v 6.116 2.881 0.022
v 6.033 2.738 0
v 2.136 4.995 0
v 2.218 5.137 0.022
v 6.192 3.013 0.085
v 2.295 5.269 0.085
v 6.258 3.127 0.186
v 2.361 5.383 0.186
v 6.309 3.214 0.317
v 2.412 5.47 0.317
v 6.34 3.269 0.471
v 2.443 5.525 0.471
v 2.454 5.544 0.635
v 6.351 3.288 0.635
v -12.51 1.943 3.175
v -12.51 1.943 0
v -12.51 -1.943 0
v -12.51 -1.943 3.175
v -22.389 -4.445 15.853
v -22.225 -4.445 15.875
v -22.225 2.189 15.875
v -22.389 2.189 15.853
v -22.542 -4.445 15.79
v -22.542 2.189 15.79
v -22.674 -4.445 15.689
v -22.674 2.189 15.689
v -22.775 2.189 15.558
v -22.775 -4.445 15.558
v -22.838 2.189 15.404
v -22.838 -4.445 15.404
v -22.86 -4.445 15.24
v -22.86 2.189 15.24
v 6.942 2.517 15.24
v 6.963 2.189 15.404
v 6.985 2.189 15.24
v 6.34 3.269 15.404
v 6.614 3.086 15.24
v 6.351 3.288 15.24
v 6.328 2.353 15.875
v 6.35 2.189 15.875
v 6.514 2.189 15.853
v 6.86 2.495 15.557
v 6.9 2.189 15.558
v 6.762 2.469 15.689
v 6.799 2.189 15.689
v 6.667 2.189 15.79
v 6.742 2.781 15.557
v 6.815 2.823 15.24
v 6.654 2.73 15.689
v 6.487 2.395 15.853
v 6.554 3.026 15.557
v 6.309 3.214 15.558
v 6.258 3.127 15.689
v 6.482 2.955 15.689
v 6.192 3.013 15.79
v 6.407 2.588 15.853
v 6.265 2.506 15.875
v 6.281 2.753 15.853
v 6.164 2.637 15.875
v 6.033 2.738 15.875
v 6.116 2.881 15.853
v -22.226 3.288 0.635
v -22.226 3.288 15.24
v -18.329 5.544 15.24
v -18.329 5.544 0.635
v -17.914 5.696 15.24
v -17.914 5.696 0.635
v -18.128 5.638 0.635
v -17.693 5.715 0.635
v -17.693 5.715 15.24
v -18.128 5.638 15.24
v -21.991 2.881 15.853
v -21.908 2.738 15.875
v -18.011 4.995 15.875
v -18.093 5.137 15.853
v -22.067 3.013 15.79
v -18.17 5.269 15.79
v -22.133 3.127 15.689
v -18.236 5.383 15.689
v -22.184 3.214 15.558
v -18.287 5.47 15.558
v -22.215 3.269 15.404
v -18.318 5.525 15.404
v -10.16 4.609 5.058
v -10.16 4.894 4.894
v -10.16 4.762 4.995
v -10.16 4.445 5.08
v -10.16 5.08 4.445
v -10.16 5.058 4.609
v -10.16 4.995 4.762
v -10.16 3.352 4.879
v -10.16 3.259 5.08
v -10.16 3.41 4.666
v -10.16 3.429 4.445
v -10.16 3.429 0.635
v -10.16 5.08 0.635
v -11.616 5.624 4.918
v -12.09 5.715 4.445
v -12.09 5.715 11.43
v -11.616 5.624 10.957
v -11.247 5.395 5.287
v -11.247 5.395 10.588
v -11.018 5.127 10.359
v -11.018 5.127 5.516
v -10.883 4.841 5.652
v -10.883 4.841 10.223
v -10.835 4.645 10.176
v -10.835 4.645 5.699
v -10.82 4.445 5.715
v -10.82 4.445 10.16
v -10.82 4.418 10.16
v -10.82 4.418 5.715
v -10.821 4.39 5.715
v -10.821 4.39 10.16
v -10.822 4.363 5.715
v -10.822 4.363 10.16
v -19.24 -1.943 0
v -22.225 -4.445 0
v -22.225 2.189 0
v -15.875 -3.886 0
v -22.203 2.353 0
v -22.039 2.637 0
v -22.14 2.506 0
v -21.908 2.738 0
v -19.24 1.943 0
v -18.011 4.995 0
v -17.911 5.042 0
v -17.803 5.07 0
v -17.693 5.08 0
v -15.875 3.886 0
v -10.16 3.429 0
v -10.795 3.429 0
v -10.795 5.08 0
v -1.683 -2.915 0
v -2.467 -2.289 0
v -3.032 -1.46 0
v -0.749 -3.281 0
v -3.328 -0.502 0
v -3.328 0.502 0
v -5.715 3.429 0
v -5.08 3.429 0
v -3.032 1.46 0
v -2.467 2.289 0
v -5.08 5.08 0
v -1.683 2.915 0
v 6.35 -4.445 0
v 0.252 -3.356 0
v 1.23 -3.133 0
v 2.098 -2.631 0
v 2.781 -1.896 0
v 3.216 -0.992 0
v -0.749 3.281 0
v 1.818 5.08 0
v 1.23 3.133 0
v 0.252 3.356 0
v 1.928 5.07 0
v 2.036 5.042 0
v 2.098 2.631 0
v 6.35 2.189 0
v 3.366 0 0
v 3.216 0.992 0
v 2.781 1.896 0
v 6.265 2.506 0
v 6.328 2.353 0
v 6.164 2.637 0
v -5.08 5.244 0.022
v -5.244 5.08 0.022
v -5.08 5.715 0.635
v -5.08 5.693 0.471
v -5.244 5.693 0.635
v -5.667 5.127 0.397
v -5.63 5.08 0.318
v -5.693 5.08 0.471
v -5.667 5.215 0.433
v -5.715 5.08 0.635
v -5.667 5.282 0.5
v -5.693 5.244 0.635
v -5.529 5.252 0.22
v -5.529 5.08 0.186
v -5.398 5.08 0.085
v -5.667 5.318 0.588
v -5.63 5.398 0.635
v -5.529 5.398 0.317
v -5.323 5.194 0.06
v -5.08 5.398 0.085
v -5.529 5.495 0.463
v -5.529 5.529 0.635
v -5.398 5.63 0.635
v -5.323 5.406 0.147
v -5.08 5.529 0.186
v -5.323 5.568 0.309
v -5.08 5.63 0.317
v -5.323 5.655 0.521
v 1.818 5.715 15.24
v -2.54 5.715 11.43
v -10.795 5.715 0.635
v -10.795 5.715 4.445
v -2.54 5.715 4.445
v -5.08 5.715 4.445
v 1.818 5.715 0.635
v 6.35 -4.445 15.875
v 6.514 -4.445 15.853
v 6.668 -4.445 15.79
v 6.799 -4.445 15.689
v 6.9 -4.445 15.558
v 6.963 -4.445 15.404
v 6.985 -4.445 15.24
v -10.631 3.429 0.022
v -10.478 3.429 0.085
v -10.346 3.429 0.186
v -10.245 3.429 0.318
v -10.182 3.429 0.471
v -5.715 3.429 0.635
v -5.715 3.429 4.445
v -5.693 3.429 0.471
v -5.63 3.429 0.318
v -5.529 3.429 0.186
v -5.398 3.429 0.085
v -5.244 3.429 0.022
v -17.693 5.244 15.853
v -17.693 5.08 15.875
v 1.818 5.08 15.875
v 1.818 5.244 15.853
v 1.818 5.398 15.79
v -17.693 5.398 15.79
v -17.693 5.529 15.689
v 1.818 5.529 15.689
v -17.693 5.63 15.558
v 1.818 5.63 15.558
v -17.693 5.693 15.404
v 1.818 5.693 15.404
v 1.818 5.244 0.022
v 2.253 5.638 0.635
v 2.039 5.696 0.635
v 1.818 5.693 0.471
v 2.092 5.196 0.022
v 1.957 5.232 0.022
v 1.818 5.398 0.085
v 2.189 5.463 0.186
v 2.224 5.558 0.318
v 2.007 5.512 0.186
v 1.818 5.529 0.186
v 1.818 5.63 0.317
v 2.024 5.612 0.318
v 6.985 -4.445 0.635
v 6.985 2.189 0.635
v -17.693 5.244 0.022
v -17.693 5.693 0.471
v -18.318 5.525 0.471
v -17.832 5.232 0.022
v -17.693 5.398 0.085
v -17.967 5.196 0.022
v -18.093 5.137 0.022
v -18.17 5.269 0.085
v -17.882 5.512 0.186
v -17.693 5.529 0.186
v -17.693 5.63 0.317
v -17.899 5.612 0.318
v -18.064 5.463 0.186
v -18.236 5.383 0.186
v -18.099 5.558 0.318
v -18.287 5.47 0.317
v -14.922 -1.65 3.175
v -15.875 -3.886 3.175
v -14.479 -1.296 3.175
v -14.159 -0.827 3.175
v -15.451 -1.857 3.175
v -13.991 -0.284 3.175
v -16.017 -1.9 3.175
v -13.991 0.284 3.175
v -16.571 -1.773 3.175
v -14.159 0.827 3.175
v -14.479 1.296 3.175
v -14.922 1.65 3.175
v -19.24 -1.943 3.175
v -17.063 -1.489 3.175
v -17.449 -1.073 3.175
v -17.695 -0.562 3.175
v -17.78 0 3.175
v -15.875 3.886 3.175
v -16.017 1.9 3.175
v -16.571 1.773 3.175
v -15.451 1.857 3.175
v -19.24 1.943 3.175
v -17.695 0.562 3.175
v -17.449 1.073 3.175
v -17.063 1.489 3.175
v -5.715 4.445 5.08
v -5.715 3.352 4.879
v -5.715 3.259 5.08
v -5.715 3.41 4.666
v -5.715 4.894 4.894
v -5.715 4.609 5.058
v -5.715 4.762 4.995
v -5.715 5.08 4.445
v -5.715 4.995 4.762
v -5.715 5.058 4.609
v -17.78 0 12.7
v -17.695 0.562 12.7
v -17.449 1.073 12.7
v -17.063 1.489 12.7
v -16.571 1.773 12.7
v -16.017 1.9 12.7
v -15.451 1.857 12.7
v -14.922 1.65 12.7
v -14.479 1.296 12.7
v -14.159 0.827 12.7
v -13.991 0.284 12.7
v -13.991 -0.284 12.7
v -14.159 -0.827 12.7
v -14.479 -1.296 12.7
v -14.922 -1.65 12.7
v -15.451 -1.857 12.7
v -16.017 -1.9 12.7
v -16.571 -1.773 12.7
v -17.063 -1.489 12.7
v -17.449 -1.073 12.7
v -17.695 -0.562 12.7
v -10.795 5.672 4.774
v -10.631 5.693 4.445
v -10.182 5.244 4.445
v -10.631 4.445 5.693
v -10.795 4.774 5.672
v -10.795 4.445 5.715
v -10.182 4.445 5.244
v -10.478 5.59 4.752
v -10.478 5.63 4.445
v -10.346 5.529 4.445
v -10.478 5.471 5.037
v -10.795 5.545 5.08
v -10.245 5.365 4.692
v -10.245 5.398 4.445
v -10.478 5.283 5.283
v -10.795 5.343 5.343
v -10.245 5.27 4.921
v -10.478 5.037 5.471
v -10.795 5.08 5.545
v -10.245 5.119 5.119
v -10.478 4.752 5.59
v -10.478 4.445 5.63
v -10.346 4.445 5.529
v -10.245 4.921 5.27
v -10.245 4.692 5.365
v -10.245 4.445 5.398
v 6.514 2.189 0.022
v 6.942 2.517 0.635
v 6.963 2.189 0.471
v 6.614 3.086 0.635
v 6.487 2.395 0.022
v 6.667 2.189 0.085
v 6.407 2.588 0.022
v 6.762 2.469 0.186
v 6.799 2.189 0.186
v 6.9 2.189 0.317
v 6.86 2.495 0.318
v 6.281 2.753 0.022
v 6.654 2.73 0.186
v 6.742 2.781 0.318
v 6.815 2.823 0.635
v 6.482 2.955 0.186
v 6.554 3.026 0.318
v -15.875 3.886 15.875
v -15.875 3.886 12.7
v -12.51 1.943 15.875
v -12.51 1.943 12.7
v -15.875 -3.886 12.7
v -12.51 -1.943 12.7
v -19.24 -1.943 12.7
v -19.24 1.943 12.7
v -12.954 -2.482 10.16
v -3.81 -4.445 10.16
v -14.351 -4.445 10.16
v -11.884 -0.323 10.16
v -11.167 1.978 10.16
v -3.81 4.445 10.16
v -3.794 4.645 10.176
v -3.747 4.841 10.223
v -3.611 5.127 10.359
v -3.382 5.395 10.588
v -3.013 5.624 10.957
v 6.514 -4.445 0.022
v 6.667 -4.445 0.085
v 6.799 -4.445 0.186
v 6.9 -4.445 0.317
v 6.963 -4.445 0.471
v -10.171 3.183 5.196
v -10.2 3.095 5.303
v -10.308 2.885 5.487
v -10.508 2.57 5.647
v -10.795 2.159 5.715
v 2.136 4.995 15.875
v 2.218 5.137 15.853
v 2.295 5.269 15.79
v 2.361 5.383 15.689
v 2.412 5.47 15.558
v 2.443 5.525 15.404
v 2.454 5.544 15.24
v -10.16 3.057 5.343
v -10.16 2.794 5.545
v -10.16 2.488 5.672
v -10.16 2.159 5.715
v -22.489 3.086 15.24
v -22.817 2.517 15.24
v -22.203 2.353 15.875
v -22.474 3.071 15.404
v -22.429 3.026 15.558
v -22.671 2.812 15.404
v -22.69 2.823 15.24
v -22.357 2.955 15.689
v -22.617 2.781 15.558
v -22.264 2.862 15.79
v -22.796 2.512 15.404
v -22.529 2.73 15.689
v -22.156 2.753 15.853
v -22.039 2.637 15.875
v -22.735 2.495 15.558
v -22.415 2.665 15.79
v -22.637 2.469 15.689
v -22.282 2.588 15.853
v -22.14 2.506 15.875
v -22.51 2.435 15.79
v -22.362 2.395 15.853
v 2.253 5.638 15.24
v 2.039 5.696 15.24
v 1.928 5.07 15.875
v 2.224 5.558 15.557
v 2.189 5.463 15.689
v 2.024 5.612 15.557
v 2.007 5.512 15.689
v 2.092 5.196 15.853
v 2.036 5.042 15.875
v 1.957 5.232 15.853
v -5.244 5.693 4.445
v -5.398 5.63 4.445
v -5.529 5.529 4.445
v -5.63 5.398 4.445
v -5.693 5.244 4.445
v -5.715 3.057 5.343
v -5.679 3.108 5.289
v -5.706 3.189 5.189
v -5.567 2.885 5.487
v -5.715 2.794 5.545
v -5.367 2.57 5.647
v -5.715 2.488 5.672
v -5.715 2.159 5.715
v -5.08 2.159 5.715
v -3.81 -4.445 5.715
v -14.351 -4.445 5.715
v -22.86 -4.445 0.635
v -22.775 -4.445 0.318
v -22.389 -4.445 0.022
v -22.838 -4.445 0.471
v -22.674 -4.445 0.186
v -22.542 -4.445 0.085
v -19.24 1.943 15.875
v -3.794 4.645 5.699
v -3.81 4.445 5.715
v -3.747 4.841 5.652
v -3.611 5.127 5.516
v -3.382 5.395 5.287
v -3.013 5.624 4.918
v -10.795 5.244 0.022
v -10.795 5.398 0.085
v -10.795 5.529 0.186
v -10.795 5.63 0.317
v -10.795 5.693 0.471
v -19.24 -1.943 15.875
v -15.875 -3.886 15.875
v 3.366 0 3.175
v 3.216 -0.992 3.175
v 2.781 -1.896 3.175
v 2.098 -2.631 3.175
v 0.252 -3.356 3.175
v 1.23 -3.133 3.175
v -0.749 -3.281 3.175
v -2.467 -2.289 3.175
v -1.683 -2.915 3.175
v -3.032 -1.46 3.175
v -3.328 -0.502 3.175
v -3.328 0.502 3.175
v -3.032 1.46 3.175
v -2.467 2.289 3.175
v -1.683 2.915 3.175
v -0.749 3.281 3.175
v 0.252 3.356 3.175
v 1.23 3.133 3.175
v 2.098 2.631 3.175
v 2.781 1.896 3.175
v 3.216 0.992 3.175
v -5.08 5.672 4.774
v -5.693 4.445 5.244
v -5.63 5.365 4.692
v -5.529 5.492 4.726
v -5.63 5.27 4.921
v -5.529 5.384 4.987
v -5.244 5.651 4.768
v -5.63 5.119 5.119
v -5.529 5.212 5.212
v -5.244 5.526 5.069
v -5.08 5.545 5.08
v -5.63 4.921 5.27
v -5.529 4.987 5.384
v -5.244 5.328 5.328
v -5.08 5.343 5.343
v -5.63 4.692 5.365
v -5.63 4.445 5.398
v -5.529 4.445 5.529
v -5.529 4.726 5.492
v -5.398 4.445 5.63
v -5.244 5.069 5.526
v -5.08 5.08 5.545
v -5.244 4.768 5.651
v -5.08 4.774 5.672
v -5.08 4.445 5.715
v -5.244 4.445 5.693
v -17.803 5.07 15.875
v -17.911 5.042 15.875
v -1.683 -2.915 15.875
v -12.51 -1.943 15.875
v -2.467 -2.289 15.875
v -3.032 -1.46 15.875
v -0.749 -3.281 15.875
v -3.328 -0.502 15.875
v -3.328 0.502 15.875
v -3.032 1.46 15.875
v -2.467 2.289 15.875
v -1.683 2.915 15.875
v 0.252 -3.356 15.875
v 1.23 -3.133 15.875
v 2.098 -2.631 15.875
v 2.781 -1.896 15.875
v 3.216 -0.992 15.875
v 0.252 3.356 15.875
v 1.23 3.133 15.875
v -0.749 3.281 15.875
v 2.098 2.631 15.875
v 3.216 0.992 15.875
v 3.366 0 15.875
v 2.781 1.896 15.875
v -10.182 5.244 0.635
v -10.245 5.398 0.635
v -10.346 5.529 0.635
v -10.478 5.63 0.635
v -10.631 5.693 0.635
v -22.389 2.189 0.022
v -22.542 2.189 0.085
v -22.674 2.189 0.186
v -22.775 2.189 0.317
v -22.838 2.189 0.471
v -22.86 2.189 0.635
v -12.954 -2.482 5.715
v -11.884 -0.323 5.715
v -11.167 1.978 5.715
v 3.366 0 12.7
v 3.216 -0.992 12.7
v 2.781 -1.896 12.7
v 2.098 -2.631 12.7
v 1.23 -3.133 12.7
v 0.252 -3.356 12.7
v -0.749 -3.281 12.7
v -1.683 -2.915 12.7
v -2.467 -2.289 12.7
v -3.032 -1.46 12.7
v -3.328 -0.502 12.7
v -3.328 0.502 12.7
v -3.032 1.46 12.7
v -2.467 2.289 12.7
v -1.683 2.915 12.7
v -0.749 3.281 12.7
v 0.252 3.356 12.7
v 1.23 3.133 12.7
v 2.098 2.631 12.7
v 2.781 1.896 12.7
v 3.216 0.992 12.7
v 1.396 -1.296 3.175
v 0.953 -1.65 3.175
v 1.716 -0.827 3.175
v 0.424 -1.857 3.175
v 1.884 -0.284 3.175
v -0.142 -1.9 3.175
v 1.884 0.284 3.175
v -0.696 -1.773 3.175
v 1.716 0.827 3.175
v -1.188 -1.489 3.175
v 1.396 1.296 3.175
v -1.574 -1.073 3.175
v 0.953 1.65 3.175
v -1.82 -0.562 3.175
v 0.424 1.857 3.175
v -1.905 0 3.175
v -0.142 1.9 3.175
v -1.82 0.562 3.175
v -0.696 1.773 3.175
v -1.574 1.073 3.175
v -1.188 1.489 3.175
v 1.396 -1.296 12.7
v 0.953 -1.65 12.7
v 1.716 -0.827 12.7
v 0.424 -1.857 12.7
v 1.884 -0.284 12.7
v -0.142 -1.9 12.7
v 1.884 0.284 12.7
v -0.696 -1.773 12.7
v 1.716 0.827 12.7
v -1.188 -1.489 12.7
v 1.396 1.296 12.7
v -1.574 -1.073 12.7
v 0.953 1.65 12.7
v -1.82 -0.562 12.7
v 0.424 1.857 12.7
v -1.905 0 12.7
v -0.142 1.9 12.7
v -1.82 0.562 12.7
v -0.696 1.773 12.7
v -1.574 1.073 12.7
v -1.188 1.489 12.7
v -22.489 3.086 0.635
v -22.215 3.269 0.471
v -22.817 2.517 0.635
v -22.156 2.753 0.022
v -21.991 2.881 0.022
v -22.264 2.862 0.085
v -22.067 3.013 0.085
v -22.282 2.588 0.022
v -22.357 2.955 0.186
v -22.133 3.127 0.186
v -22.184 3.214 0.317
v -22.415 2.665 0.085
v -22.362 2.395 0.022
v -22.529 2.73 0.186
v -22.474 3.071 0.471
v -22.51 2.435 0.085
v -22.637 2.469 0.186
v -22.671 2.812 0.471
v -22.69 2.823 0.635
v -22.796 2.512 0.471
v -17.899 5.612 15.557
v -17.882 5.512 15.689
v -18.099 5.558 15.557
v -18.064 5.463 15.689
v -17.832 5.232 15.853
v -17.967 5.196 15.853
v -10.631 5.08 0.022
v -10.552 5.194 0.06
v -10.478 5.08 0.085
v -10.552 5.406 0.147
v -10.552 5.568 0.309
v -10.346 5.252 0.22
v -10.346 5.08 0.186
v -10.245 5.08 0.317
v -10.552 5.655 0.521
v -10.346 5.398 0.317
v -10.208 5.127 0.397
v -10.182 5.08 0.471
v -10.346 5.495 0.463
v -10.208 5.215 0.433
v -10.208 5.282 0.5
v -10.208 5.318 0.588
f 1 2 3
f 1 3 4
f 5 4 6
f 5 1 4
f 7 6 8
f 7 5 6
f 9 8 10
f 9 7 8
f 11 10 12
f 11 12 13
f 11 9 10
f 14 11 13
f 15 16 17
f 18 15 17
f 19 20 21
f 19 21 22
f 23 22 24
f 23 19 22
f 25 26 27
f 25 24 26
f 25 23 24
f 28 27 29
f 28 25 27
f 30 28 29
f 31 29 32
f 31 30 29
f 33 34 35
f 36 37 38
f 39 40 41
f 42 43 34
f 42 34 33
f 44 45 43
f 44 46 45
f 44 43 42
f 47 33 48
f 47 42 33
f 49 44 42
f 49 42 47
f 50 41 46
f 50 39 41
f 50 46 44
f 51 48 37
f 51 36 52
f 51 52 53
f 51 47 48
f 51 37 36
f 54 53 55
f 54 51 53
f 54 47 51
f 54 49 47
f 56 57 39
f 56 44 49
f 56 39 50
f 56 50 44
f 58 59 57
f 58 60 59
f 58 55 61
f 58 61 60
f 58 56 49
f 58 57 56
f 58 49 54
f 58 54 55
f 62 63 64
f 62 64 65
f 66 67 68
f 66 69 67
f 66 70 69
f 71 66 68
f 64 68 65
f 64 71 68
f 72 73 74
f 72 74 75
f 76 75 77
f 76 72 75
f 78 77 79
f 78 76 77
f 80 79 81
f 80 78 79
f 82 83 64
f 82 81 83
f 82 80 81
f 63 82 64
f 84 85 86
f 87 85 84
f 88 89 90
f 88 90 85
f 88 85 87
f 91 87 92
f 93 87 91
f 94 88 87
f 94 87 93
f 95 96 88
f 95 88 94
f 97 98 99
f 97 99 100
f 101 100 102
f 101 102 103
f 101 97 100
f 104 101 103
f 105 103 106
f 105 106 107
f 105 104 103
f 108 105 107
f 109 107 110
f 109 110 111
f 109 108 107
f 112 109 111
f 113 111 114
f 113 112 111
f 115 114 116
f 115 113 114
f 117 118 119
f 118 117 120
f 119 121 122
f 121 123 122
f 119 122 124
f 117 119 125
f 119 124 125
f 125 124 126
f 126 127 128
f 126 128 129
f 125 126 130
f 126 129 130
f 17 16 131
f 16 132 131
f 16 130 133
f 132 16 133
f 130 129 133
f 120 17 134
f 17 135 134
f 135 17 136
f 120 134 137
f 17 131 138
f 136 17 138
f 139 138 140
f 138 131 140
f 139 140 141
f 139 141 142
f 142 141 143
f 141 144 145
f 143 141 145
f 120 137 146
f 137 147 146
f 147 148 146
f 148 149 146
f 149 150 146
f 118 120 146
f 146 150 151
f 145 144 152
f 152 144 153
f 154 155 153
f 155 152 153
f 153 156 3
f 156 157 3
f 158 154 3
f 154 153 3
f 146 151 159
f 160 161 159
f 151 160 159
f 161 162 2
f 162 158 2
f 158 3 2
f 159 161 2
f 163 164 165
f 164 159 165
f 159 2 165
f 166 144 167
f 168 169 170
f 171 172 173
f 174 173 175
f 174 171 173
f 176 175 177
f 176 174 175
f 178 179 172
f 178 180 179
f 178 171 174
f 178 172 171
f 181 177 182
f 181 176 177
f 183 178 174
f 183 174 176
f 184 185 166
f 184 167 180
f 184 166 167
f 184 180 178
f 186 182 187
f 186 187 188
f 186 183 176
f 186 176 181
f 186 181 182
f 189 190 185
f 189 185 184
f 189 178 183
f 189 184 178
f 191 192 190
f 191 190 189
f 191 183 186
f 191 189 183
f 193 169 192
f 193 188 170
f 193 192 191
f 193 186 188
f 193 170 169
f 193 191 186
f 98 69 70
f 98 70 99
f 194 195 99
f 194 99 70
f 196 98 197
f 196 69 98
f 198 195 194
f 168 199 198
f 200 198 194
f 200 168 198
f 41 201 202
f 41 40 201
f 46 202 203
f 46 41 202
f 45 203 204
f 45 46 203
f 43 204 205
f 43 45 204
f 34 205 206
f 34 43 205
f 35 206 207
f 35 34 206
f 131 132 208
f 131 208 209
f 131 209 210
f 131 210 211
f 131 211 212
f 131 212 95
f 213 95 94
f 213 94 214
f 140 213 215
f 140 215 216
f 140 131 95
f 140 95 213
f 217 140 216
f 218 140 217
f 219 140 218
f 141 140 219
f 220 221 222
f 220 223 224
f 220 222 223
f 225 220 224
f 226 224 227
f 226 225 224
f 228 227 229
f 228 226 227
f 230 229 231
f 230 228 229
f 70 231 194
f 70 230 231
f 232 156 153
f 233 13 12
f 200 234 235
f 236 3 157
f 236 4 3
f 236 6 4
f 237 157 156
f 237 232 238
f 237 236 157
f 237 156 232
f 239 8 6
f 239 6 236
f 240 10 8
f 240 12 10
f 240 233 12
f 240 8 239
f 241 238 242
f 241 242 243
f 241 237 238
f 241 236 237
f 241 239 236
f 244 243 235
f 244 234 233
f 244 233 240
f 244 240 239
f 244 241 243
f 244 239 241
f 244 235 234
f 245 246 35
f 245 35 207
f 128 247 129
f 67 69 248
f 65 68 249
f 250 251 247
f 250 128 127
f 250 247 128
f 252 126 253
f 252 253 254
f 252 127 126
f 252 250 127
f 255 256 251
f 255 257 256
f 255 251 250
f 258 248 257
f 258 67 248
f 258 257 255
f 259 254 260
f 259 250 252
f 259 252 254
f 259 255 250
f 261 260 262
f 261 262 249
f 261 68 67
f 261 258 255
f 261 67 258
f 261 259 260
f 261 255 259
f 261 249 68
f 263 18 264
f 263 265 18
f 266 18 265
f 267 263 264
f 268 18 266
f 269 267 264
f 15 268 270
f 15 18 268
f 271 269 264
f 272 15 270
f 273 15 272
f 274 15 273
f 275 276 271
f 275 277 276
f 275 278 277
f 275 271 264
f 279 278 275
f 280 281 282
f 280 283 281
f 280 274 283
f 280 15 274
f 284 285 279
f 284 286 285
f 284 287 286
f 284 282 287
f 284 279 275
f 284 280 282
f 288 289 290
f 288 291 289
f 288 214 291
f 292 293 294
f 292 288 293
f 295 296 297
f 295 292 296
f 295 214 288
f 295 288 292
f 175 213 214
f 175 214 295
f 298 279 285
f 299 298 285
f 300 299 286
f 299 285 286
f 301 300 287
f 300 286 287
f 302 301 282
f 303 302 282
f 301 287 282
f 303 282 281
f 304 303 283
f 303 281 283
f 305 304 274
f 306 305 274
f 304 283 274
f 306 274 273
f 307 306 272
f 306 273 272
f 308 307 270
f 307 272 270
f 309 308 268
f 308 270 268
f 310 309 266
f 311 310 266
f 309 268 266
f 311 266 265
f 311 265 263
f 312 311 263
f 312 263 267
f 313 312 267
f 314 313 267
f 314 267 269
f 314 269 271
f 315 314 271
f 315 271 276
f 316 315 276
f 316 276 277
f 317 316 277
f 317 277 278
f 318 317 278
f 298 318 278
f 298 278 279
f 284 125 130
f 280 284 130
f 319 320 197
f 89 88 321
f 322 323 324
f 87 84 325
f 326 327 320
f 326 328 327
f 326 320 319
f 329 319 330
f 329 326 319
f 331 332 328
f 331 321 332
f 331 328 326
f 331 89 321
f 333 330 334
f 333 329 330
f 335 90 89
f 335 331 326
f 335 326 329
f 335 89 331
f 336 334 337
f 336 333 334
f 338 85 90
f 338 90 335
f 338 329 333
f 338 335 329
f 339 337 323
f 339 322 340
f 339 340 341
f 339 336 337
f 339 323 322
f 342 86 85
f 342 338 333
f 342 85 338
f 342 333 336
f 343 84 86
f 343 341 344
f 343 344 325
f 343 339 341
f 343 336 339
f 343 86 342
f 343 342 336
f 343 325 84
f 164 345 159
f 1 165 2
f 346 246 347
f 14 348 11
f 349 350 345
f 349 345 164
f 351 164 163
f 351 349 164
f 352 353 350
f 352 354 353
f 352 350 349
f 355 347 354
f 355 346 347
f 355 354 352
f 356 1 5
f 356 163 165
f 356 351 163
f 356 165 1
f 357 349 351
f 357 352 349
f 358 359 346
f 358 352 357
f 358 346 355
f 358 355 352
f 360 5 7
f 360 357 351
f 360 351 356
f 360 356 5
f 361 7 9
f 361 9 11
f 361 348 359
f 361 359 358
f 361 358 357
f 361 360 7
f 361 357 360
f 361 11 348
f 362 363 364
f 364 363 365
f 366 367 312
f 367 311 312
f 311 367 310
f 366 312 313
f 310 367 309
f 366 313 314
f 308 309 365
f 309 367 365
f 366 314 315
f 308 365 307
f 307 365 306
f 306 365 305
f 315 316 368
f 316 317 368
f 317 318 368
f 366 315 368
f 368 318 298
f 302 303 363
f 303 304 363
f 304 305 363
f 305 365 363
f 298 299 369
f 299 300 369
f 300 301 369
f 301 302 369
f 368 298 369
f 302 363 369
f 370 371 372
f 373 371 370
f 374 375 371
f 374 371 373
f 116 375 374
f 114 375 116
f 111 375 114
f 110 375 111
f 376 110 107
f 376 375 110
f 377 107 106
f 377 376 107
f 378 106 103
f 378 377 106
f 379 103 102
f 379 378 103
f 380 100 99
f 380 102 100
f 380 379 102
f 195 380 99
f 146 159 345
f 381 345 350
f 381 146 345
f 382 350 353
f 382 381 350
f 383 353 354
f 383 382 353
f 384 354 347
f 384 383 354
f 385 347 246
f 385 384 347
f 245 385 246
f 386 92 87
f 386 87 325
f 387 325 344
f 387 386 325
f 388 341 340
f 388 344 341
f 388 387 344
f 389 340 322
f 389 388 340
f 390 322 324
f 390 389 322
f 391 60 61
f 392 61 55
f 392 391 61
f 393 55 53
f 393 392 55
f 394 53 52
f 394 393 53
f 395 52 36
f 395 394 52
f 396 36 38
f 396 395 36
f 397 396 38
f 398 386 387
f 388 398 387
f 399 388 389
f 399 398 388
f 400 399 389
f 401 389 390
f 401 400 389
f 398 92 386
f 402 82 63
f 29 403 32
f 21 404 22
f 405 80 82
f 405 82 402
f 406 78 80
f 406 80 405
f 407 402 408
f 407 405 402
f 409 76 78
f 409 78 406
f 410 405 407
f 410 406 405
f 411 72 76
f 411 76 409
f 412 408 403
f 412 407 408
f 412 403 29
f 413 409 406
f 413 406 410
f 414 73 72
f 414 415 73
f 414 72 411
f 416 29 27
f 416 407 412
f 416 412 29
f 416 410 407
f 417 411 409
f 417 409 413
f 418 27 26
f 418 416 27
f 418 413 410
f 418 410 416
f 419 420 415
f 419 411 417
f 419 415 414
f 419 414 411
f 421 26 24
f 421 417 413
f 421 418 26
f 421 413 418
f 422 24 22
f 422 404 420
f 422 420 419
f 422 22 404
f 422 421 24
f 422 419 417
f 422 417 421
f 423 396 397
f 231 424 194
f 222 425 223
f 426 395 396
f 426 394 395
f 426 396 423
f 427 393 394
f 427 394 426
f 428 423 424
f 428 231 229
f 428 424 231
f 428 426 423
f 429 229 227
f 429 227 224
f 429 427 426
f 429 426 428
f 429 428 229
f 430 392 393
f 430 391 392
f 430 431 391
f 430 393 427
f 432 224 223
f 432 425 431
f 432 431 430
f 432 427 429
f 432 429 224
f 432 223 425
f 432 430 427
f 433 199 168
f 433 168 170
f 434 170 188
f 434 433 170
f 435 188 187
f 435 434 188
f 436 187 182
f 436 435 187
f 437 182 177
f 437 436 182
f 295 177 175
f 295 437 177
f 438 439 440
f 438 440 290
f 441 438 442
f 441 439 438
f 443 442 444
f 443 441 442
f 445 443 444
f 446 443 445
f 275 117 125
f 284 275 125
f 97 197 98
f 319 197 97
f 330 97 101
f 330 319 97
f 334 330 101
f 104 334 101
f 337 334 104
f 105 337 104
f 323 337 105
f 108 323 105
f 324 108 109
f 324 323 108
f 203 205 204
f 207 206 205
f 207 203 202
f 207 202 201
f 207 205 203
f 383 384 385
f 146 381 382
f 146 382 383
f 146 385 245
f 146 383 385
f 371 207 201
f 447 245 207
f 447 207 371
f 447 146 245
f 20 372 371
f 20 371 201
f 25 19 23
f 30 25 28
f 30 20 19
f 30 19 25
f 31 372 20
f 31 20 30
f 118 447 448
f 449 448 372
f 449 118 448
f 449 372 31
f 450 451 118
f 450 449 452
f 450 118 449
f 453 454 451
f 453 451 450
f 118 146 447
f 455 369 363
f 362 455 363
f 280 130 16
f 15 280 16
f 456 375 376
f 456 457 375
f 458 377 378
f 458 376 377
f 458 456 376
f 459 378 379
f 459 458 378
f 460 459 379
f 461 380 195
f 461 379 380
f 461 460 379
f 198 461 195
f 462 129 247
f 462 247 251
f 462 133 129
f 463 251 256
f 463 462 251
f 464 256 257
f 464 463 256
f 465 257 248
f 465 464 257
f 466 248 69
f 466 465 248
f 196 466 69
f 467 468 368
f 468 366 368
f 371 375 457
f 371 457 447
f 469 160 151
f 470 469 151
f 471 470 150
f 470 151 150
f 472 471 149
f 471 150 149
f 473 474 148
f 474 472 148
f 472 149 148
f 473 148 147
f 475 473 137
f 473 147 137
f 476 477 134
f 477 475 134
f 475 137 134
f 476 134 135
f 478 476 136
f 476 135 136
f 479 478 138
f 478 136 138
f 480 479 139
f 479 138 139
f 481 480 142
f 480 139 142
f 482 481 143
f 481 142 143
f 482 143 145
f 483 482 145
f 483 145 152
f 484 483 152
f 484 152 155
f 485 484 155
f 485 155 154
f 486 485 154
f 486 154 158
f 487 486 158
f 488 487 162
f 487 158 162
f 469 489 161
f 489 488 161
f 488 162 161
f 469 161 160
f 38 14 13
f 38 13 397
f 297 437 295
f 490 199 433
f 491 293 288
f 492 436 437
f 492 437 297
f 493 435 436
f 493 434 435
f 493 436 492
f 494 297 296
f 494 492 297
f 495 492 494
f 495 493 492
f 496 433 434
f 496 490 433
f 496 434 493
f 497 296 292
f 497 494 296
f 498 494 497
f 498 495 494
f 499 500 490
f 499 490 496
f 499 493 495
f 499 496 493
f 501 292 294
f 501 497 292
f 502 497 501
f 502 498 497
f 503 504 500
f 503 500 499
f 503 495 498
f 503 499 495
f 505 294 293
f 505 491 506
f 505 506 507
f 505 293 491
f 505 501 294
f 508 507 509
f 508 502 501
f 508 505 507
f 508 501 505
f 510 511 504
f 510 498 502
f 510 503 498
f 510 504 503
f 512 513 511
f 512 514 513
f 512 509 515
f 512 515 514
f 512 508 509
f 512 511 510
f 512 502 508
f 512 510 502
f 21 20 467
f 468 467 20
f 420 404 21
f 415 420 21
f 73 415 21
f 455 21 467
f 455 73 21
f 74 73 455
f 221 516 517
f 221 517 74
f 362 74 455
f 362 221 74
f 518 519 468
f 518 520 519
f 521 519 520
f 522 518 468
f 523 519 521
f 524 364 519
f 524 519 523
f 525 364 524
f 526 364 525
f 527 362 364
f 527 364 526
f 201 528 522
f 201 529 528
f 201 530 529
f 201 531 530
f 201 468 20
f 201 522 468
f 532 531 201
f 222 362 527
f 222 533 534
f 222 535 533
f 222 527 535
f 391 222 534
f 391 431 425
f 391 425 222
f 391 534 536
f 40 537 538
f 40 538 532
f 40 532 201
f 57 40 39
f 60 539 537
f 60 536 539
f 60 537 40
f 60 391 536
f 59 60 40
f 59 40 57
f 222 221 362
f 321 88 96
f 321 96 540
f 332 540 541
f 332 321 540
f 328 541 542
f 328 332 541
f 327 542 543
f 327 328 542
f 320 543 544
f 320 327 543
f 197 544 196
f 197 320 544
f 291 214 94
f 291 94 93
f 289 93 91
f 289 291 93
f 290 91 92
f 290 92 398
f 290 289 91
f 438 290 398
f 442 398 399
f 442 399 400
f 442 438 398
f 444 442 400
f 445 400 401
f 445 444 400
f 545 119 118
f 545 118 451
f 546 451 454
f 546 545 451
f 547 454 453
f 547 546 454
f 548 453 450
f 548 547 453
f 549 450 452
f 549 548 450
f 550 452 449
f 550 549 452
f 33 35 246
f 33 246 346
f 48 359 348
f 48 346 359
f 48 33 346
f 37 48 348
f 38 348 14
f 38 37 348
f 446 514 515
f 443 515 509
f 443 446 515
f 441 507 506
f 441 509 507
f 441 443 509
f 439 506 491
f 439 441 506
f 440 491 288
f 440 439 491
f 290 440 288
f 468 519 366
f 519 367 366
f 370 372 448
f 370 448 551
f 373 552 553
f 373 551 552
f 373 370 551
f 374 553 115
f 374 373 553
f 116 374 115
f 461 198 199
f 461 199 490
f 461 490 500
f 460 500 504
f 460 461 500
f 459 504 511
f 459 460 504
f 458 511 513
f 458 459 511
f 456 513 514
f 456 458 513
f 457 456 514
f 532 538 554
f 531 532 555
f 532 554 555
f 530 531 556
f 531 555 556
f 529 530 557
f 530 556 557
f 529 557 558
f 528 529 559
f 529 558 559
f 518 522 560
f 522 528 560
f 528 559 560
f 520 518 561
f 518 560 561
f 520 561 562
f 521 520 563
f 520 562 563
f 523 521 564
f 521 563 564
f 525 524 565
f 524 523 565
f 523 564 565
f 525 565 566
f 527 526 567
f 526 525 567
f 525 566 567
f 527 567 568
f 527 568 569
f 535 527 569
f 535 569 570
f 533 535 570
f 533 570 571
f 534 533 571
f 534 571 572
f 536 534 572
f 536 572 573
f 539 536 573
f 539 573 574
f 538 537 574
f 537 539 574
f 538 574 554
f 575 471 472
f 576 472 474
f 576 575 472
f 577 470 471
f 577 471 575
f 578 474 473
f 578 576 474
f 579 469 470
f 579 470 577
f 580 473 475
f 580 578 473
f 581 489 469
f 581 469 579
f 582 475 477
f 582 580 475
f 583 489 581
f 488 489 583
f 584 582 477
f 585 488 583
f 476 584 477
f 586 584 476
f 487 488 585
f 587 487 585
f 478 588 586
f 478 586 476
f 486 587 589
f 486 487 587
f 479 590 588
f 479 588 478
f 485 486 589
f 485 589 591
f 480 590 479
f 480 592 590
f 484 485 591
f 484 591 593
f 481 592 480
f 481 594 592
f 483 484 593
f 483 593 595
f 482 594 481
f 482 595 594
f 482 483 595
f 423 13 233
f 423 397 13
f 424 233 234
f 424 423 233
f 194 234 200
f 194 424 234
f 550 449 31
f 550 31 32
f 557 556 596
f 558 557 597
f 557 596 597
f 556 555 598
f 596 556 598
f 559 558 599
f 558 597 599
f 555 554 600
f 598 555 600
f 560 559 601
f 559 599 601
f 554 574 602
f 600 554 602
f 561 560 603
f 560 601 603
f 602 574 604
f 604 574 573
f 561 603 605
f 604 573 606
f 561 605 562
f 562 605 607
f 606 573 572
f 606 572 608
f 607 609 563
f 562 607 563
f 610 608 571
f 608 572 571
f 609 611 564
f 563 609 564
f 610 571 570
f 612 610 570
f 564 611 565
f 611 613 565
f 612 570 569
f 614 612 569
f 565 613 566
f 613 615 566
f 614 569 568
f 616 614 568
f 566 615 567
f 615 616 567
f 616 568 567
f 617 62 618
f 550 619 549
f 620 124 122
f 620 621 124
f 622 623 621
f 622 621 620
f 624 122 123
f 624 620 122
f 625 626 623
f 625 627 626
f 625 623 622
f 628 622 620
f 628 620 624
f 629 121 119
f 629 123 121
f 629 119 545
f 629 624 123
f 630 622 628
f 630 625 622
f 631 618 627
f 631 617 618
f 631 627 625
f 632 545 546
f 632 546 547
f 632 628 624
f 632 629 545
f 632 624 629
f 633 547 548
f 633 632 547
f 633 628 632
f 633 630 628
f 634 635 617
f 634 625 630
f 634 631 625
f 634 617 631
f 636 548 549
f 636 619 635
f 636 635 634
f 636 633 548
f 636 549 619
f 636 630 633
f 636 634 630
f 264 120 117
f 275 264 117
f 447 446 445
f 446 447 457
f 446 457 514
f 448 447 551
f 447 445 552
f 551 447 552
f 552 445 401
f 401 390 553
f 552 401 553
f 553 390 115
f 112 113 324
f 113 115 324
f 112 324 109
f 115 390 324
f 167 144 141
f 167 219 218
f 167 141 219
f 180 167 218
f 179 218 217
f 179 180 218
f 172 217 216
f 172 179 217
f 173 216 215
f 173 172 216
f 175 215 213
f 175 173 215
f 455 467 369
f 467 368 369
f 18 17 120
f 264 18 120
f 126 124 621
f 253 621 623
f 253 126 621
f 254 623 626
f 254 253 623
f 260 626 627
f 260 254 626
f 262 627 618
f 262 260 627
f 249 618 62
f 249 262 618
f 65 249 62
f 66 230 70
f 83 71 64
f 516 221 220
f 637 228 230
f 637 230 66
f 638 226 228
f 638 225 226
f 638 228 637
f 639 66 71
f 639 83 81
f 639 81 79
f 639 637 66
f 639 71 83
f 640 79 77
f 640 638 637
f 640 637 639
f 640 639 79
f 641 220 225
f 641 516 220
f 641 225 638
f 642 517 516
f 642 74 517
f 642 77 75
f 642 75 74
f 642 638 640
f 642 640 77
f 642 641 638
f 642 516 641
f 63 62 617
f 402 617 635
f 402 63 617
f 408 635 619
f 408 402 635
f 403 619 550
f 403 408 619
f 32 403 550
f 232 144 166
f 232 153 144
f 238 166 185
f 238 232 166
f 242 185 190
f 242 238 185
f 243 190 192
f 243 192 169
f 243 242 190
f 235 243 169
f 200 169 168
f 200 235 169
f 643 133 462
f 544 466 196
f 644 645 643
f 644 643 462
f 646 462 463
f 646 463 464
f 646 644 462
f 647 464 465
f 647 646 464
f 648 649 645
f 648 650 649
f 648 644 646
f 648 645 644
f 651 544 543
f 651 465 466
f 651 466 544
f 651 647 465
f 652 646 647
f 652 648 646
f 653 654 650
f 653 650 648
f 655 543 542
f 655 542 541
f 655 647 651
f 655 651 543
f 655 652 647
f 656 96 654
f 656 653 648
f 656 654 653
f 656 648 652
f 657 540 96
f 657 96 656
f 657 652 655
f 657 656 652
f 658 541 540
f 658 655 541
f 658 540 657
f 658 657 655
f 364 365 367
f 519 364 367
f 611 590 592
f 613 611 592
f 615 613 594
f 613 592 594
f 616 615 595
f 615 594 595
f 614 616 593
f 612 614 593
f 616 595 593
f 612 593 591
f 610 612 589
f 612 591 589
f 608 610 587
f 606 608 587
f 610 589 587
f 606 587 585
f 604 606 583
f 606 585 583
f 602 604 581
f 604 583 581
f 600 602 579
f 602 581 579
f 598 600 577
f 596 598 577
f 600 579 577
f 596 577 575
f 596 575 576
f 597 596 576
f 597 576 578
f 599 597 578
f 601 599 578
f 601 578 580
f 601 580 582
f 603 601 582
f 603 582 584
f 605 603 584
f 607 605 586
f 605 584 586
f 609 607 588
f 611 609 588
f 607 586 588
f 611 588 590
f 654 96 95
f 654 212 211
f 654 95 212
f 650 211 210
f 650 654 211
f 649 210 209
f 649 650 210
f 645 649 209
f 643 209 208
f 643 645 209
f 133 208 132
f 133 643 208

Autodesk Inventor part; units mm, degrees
ref_plane "YZ Plane" through (0, 0, 0) normal (1, 0, 0) x (0, 1, 0)
sketch "Sketch1" plane through (0, 0, 0) normal (0, 0, 1) x (1, 0, 0)
  circle A0 centre (0, 0) radius 3.3655
  circle A1 centre (0, 0) radius 1.905
  circle A2 centre (-15.875, 0) radius 1.905
  line L0 (-15.875, -3.8861) -> (-19.2405, -1.9431)
  line L1 (-19.2405, -1.9431) -> (-19.2405, 1.9431)
  line L2 (-19.2405, 1.9431) -> (-15.875, 3.8861)
  line L3 (-15.875, 3.8861) -> (-12.5095, 1.9431)
  line L4 (-12.5095, 1.9431) -> (-12.5095, -1.9431)
  line L5 (-12.5095, -1.9431) -> (-15.875, -3.8861)
  line L6 (-22.86, 5.715) -> (6.985, 5.715)
  line L7 (6.985, 5.715) -> (6.985, -4.445)
  line L8 (6.985, -4.445) -> (-22.86, -4.445)
  line L9 (-22.86, -4.445) -> (-22.86, 5.715)
  dimension "d0" = 6.731
  dimension "d1" = 3.81
  dimension "d2" = 3.81
  dimension "d3" = 6.731
  dimension "d4" = 15.875
  dimension "d5" = 10.16
  dimension "d6" = 29.845
  dimension "d30" = 4.445
  dimension "d31" = 6.985
extrude "Extrusion1" add sketch "Sketch1" along normal blind 15.875 contours L6 L7 L8 L9
ref_plane "Work Plane1" through (0, 0, 3.175) normal (0, 0, -1) x (-1, 0, 0)
sketch "Sketch2" plane through (0, 0, 3.175) normal (0, 0, -1) x (-1, 0, 0)
  circle A0 centre (0, 0) radius 1.905 projected
  circle A1 centre (0, 0) radius 3.3655 projected
  circle A2 centre (15.875, 0) radius 1.905 projected
  line L0 (19.2405, 1.9431) -> (19.2405, -1.9431) projected
  line L1 (19.2405, -1.9431) -> (15.875, -3.8861) projected
  line L2 (15.875, -3.8861) -> (12.5095, -1.9431) projected
  line L3 (12.5095, -1.9431) -> (12.5095, 1.9431) projected
  line L4 (12.5095, 1.9431) -> (15.875, 3.8861) projected
  line L5 (15.875, 3.8861) -> (19.2405, 1.9431) projected
  circle A3 centre (0, 0) radius 3.3655 projected
  line L6 (22.86, 5.715) -> (-6.985, 5.715) projected
  line L7 (-6.985, 5.715) -> (-6.985, -4.445) projected
  line L8 (-6.985, -4.445) -> (22.86, -4.445) projected
  line L9 (22.86, -4.445) -> (22.86, 5.715) projected
extrude "Extrusion2" add sketch "Sketch2" against normal blind 9.525 contours A1 | L0 L1 L2 L3 L4 L5
ref_plane "Work Plane2" through (0, 0, 7.9375) normal (0, 0, -1) x (-1, 0, 0)
sketch "Sketch4" plane through (0, 0, 7.9375) normal (0, 0, -1) x (-1, 0, 0)
  circle A0 centre (0, 0) radius 1.905 construction
  circle A1 centre (15.875, 0) radius 1.905 construction
  line L0 (-6.985, -4.445) -> (-6.985, 5.715) construction
  line L1 (-6.985, 5.715) -> (22.86, 5.715) construction
  line L2 (22.86, 5.715) -> (22.86, -4.445) construction
  line L3 (22.86, -4.445) -> (-6.985, -4.445) construction
  line L4 (22.86, 5.715) -> (-6.985, 5.715) projected
  line L5 (-6.985, -4.445) -> (22.86, -4.445) projected
  arc A2 (10.795, 5.715) -> (14.351, -4.445) centre (26.0305, 5.3451) ccw
  line L6 (10.795, 5.715) -> (3.81, 5.715)
  line L7 (3.81, 5.715) -> (3.81, -4.445)
  line L8 (3.81, -4.445) -> (14.351, -4.445)
  dimension "d14" = 15.24
  dimension "d15" = 12.065
  dimension "d16" = 8.509
  dimension "d17" = 10.795
extrude "Extrusion3" cut sketch "Sketch4" along normal mid plane 4.445
fillet "Fillet4" radius 1.27 4 edges at (-7.3025, 5.715, 5.715) (-7.3025, 5.715, 10.16) (-3.81, 5.715, 7.9375) (-10.795, 5.715, 7.9375)
chamfer "Chamfer1" distance 4.826 distance2 2.794 1 edges at (-22.86, 5.715, 7.9375) measured on face at (-19.2698, 5.715, 6.7733)
chamfer "Chamfer2" distance 4.826 distance2 2.794 1 edges at (6.985, 5.715, 7.9375) measured on face at (3.81, 5.715, 9.1017)
fillet "Fillet5" radius 1.27 4 edges at (-18.034, 5.715, 7.9375) (-22.86, 2.921, 7.9375) (2.159, 5.715, 7.9375) (6.985, 2.921, 7.9375)
fillet "Fillet6" radius 0.635 18 edges at (-18.0223, 5.6715, 15.875) (-20.2778, 4.416, 15.875) (-22.6902, 2.8231, 15.875) (-22.86, -1.1281, 15.875) (2.1473, 5.6715, 15.875) (4.4028, 4.416, 15.875) (6.8152, 2.8231, 15.875) (6.985, -1.1281, 15.875) (-7.9375, 5.715, 15.875) (2.1473, 5.6715, 0) (4.4028, 4.416, 0) (6.8152, 2.8231, 0) (6.985, -1.1281, 0) (-18.0223, 5.6715, 0) (-20.2778, 4.416, 0) (-22.6902, 2.8231, 0) (-22.86, -1.1281, 0) (-7.9375, 5.715, 0)
sketch "Sketch5" plane through (0, 0, 0) normal (0, 0, -1) x (-1, 0, 0)
  line L0 (5.715, 5.715) -> (10.16, 5.715)
  line L1 (10.16, 5.715) -> (10.16, 3.429)
  line L2 (10.16, 3.429) -> (5.715, 3.429)
  line L3 (5.715, 3.429) -> (5.715, 5.715)
  circle A0 centre (15.875, 0) radius 1.905 construction
  circle A1 centre (0, 0) radius 1.905 construction
  line L4 (0, 0) -> (15.875, 0) construction
  line L5 (17.6929, 5.715) -> (-1.8179, 5.715) construction
  point P0 (7.9375, 3.429)
  point P1 (7.9375, 0)
  dimension "d32" = 4.445
  dimension "d33" = 2.286
extrude "Extrusion4" cut sketch "Sketch5" against normal up to surface (5.715 mm away)
fillet "Fillet7" radius 0.635 10 edges at (-5.715, 5.529, 0.186) (-5.715, 5.715, 2.54) (-5.715, 5.343, 5.343) (-5.715, 3.937, 5.715) (-5.715, 4.2545, 0) (-10.16, 5.529, 0.186) (-10.16, 5.715, 2.54) (-10.16, 5.343, 5.343) (-10.16, 3.937, 5.715) (-10.16, 4.2545, 0)
fillet "Fillet8" radius 1.27 1 edges at (-7.9375, 3.429, 5.715)
equation "\"d31\" = -0.5 * d4 + 0.5 * d6"
properties part number "CarriageImproved" material "ABS Plastic"
